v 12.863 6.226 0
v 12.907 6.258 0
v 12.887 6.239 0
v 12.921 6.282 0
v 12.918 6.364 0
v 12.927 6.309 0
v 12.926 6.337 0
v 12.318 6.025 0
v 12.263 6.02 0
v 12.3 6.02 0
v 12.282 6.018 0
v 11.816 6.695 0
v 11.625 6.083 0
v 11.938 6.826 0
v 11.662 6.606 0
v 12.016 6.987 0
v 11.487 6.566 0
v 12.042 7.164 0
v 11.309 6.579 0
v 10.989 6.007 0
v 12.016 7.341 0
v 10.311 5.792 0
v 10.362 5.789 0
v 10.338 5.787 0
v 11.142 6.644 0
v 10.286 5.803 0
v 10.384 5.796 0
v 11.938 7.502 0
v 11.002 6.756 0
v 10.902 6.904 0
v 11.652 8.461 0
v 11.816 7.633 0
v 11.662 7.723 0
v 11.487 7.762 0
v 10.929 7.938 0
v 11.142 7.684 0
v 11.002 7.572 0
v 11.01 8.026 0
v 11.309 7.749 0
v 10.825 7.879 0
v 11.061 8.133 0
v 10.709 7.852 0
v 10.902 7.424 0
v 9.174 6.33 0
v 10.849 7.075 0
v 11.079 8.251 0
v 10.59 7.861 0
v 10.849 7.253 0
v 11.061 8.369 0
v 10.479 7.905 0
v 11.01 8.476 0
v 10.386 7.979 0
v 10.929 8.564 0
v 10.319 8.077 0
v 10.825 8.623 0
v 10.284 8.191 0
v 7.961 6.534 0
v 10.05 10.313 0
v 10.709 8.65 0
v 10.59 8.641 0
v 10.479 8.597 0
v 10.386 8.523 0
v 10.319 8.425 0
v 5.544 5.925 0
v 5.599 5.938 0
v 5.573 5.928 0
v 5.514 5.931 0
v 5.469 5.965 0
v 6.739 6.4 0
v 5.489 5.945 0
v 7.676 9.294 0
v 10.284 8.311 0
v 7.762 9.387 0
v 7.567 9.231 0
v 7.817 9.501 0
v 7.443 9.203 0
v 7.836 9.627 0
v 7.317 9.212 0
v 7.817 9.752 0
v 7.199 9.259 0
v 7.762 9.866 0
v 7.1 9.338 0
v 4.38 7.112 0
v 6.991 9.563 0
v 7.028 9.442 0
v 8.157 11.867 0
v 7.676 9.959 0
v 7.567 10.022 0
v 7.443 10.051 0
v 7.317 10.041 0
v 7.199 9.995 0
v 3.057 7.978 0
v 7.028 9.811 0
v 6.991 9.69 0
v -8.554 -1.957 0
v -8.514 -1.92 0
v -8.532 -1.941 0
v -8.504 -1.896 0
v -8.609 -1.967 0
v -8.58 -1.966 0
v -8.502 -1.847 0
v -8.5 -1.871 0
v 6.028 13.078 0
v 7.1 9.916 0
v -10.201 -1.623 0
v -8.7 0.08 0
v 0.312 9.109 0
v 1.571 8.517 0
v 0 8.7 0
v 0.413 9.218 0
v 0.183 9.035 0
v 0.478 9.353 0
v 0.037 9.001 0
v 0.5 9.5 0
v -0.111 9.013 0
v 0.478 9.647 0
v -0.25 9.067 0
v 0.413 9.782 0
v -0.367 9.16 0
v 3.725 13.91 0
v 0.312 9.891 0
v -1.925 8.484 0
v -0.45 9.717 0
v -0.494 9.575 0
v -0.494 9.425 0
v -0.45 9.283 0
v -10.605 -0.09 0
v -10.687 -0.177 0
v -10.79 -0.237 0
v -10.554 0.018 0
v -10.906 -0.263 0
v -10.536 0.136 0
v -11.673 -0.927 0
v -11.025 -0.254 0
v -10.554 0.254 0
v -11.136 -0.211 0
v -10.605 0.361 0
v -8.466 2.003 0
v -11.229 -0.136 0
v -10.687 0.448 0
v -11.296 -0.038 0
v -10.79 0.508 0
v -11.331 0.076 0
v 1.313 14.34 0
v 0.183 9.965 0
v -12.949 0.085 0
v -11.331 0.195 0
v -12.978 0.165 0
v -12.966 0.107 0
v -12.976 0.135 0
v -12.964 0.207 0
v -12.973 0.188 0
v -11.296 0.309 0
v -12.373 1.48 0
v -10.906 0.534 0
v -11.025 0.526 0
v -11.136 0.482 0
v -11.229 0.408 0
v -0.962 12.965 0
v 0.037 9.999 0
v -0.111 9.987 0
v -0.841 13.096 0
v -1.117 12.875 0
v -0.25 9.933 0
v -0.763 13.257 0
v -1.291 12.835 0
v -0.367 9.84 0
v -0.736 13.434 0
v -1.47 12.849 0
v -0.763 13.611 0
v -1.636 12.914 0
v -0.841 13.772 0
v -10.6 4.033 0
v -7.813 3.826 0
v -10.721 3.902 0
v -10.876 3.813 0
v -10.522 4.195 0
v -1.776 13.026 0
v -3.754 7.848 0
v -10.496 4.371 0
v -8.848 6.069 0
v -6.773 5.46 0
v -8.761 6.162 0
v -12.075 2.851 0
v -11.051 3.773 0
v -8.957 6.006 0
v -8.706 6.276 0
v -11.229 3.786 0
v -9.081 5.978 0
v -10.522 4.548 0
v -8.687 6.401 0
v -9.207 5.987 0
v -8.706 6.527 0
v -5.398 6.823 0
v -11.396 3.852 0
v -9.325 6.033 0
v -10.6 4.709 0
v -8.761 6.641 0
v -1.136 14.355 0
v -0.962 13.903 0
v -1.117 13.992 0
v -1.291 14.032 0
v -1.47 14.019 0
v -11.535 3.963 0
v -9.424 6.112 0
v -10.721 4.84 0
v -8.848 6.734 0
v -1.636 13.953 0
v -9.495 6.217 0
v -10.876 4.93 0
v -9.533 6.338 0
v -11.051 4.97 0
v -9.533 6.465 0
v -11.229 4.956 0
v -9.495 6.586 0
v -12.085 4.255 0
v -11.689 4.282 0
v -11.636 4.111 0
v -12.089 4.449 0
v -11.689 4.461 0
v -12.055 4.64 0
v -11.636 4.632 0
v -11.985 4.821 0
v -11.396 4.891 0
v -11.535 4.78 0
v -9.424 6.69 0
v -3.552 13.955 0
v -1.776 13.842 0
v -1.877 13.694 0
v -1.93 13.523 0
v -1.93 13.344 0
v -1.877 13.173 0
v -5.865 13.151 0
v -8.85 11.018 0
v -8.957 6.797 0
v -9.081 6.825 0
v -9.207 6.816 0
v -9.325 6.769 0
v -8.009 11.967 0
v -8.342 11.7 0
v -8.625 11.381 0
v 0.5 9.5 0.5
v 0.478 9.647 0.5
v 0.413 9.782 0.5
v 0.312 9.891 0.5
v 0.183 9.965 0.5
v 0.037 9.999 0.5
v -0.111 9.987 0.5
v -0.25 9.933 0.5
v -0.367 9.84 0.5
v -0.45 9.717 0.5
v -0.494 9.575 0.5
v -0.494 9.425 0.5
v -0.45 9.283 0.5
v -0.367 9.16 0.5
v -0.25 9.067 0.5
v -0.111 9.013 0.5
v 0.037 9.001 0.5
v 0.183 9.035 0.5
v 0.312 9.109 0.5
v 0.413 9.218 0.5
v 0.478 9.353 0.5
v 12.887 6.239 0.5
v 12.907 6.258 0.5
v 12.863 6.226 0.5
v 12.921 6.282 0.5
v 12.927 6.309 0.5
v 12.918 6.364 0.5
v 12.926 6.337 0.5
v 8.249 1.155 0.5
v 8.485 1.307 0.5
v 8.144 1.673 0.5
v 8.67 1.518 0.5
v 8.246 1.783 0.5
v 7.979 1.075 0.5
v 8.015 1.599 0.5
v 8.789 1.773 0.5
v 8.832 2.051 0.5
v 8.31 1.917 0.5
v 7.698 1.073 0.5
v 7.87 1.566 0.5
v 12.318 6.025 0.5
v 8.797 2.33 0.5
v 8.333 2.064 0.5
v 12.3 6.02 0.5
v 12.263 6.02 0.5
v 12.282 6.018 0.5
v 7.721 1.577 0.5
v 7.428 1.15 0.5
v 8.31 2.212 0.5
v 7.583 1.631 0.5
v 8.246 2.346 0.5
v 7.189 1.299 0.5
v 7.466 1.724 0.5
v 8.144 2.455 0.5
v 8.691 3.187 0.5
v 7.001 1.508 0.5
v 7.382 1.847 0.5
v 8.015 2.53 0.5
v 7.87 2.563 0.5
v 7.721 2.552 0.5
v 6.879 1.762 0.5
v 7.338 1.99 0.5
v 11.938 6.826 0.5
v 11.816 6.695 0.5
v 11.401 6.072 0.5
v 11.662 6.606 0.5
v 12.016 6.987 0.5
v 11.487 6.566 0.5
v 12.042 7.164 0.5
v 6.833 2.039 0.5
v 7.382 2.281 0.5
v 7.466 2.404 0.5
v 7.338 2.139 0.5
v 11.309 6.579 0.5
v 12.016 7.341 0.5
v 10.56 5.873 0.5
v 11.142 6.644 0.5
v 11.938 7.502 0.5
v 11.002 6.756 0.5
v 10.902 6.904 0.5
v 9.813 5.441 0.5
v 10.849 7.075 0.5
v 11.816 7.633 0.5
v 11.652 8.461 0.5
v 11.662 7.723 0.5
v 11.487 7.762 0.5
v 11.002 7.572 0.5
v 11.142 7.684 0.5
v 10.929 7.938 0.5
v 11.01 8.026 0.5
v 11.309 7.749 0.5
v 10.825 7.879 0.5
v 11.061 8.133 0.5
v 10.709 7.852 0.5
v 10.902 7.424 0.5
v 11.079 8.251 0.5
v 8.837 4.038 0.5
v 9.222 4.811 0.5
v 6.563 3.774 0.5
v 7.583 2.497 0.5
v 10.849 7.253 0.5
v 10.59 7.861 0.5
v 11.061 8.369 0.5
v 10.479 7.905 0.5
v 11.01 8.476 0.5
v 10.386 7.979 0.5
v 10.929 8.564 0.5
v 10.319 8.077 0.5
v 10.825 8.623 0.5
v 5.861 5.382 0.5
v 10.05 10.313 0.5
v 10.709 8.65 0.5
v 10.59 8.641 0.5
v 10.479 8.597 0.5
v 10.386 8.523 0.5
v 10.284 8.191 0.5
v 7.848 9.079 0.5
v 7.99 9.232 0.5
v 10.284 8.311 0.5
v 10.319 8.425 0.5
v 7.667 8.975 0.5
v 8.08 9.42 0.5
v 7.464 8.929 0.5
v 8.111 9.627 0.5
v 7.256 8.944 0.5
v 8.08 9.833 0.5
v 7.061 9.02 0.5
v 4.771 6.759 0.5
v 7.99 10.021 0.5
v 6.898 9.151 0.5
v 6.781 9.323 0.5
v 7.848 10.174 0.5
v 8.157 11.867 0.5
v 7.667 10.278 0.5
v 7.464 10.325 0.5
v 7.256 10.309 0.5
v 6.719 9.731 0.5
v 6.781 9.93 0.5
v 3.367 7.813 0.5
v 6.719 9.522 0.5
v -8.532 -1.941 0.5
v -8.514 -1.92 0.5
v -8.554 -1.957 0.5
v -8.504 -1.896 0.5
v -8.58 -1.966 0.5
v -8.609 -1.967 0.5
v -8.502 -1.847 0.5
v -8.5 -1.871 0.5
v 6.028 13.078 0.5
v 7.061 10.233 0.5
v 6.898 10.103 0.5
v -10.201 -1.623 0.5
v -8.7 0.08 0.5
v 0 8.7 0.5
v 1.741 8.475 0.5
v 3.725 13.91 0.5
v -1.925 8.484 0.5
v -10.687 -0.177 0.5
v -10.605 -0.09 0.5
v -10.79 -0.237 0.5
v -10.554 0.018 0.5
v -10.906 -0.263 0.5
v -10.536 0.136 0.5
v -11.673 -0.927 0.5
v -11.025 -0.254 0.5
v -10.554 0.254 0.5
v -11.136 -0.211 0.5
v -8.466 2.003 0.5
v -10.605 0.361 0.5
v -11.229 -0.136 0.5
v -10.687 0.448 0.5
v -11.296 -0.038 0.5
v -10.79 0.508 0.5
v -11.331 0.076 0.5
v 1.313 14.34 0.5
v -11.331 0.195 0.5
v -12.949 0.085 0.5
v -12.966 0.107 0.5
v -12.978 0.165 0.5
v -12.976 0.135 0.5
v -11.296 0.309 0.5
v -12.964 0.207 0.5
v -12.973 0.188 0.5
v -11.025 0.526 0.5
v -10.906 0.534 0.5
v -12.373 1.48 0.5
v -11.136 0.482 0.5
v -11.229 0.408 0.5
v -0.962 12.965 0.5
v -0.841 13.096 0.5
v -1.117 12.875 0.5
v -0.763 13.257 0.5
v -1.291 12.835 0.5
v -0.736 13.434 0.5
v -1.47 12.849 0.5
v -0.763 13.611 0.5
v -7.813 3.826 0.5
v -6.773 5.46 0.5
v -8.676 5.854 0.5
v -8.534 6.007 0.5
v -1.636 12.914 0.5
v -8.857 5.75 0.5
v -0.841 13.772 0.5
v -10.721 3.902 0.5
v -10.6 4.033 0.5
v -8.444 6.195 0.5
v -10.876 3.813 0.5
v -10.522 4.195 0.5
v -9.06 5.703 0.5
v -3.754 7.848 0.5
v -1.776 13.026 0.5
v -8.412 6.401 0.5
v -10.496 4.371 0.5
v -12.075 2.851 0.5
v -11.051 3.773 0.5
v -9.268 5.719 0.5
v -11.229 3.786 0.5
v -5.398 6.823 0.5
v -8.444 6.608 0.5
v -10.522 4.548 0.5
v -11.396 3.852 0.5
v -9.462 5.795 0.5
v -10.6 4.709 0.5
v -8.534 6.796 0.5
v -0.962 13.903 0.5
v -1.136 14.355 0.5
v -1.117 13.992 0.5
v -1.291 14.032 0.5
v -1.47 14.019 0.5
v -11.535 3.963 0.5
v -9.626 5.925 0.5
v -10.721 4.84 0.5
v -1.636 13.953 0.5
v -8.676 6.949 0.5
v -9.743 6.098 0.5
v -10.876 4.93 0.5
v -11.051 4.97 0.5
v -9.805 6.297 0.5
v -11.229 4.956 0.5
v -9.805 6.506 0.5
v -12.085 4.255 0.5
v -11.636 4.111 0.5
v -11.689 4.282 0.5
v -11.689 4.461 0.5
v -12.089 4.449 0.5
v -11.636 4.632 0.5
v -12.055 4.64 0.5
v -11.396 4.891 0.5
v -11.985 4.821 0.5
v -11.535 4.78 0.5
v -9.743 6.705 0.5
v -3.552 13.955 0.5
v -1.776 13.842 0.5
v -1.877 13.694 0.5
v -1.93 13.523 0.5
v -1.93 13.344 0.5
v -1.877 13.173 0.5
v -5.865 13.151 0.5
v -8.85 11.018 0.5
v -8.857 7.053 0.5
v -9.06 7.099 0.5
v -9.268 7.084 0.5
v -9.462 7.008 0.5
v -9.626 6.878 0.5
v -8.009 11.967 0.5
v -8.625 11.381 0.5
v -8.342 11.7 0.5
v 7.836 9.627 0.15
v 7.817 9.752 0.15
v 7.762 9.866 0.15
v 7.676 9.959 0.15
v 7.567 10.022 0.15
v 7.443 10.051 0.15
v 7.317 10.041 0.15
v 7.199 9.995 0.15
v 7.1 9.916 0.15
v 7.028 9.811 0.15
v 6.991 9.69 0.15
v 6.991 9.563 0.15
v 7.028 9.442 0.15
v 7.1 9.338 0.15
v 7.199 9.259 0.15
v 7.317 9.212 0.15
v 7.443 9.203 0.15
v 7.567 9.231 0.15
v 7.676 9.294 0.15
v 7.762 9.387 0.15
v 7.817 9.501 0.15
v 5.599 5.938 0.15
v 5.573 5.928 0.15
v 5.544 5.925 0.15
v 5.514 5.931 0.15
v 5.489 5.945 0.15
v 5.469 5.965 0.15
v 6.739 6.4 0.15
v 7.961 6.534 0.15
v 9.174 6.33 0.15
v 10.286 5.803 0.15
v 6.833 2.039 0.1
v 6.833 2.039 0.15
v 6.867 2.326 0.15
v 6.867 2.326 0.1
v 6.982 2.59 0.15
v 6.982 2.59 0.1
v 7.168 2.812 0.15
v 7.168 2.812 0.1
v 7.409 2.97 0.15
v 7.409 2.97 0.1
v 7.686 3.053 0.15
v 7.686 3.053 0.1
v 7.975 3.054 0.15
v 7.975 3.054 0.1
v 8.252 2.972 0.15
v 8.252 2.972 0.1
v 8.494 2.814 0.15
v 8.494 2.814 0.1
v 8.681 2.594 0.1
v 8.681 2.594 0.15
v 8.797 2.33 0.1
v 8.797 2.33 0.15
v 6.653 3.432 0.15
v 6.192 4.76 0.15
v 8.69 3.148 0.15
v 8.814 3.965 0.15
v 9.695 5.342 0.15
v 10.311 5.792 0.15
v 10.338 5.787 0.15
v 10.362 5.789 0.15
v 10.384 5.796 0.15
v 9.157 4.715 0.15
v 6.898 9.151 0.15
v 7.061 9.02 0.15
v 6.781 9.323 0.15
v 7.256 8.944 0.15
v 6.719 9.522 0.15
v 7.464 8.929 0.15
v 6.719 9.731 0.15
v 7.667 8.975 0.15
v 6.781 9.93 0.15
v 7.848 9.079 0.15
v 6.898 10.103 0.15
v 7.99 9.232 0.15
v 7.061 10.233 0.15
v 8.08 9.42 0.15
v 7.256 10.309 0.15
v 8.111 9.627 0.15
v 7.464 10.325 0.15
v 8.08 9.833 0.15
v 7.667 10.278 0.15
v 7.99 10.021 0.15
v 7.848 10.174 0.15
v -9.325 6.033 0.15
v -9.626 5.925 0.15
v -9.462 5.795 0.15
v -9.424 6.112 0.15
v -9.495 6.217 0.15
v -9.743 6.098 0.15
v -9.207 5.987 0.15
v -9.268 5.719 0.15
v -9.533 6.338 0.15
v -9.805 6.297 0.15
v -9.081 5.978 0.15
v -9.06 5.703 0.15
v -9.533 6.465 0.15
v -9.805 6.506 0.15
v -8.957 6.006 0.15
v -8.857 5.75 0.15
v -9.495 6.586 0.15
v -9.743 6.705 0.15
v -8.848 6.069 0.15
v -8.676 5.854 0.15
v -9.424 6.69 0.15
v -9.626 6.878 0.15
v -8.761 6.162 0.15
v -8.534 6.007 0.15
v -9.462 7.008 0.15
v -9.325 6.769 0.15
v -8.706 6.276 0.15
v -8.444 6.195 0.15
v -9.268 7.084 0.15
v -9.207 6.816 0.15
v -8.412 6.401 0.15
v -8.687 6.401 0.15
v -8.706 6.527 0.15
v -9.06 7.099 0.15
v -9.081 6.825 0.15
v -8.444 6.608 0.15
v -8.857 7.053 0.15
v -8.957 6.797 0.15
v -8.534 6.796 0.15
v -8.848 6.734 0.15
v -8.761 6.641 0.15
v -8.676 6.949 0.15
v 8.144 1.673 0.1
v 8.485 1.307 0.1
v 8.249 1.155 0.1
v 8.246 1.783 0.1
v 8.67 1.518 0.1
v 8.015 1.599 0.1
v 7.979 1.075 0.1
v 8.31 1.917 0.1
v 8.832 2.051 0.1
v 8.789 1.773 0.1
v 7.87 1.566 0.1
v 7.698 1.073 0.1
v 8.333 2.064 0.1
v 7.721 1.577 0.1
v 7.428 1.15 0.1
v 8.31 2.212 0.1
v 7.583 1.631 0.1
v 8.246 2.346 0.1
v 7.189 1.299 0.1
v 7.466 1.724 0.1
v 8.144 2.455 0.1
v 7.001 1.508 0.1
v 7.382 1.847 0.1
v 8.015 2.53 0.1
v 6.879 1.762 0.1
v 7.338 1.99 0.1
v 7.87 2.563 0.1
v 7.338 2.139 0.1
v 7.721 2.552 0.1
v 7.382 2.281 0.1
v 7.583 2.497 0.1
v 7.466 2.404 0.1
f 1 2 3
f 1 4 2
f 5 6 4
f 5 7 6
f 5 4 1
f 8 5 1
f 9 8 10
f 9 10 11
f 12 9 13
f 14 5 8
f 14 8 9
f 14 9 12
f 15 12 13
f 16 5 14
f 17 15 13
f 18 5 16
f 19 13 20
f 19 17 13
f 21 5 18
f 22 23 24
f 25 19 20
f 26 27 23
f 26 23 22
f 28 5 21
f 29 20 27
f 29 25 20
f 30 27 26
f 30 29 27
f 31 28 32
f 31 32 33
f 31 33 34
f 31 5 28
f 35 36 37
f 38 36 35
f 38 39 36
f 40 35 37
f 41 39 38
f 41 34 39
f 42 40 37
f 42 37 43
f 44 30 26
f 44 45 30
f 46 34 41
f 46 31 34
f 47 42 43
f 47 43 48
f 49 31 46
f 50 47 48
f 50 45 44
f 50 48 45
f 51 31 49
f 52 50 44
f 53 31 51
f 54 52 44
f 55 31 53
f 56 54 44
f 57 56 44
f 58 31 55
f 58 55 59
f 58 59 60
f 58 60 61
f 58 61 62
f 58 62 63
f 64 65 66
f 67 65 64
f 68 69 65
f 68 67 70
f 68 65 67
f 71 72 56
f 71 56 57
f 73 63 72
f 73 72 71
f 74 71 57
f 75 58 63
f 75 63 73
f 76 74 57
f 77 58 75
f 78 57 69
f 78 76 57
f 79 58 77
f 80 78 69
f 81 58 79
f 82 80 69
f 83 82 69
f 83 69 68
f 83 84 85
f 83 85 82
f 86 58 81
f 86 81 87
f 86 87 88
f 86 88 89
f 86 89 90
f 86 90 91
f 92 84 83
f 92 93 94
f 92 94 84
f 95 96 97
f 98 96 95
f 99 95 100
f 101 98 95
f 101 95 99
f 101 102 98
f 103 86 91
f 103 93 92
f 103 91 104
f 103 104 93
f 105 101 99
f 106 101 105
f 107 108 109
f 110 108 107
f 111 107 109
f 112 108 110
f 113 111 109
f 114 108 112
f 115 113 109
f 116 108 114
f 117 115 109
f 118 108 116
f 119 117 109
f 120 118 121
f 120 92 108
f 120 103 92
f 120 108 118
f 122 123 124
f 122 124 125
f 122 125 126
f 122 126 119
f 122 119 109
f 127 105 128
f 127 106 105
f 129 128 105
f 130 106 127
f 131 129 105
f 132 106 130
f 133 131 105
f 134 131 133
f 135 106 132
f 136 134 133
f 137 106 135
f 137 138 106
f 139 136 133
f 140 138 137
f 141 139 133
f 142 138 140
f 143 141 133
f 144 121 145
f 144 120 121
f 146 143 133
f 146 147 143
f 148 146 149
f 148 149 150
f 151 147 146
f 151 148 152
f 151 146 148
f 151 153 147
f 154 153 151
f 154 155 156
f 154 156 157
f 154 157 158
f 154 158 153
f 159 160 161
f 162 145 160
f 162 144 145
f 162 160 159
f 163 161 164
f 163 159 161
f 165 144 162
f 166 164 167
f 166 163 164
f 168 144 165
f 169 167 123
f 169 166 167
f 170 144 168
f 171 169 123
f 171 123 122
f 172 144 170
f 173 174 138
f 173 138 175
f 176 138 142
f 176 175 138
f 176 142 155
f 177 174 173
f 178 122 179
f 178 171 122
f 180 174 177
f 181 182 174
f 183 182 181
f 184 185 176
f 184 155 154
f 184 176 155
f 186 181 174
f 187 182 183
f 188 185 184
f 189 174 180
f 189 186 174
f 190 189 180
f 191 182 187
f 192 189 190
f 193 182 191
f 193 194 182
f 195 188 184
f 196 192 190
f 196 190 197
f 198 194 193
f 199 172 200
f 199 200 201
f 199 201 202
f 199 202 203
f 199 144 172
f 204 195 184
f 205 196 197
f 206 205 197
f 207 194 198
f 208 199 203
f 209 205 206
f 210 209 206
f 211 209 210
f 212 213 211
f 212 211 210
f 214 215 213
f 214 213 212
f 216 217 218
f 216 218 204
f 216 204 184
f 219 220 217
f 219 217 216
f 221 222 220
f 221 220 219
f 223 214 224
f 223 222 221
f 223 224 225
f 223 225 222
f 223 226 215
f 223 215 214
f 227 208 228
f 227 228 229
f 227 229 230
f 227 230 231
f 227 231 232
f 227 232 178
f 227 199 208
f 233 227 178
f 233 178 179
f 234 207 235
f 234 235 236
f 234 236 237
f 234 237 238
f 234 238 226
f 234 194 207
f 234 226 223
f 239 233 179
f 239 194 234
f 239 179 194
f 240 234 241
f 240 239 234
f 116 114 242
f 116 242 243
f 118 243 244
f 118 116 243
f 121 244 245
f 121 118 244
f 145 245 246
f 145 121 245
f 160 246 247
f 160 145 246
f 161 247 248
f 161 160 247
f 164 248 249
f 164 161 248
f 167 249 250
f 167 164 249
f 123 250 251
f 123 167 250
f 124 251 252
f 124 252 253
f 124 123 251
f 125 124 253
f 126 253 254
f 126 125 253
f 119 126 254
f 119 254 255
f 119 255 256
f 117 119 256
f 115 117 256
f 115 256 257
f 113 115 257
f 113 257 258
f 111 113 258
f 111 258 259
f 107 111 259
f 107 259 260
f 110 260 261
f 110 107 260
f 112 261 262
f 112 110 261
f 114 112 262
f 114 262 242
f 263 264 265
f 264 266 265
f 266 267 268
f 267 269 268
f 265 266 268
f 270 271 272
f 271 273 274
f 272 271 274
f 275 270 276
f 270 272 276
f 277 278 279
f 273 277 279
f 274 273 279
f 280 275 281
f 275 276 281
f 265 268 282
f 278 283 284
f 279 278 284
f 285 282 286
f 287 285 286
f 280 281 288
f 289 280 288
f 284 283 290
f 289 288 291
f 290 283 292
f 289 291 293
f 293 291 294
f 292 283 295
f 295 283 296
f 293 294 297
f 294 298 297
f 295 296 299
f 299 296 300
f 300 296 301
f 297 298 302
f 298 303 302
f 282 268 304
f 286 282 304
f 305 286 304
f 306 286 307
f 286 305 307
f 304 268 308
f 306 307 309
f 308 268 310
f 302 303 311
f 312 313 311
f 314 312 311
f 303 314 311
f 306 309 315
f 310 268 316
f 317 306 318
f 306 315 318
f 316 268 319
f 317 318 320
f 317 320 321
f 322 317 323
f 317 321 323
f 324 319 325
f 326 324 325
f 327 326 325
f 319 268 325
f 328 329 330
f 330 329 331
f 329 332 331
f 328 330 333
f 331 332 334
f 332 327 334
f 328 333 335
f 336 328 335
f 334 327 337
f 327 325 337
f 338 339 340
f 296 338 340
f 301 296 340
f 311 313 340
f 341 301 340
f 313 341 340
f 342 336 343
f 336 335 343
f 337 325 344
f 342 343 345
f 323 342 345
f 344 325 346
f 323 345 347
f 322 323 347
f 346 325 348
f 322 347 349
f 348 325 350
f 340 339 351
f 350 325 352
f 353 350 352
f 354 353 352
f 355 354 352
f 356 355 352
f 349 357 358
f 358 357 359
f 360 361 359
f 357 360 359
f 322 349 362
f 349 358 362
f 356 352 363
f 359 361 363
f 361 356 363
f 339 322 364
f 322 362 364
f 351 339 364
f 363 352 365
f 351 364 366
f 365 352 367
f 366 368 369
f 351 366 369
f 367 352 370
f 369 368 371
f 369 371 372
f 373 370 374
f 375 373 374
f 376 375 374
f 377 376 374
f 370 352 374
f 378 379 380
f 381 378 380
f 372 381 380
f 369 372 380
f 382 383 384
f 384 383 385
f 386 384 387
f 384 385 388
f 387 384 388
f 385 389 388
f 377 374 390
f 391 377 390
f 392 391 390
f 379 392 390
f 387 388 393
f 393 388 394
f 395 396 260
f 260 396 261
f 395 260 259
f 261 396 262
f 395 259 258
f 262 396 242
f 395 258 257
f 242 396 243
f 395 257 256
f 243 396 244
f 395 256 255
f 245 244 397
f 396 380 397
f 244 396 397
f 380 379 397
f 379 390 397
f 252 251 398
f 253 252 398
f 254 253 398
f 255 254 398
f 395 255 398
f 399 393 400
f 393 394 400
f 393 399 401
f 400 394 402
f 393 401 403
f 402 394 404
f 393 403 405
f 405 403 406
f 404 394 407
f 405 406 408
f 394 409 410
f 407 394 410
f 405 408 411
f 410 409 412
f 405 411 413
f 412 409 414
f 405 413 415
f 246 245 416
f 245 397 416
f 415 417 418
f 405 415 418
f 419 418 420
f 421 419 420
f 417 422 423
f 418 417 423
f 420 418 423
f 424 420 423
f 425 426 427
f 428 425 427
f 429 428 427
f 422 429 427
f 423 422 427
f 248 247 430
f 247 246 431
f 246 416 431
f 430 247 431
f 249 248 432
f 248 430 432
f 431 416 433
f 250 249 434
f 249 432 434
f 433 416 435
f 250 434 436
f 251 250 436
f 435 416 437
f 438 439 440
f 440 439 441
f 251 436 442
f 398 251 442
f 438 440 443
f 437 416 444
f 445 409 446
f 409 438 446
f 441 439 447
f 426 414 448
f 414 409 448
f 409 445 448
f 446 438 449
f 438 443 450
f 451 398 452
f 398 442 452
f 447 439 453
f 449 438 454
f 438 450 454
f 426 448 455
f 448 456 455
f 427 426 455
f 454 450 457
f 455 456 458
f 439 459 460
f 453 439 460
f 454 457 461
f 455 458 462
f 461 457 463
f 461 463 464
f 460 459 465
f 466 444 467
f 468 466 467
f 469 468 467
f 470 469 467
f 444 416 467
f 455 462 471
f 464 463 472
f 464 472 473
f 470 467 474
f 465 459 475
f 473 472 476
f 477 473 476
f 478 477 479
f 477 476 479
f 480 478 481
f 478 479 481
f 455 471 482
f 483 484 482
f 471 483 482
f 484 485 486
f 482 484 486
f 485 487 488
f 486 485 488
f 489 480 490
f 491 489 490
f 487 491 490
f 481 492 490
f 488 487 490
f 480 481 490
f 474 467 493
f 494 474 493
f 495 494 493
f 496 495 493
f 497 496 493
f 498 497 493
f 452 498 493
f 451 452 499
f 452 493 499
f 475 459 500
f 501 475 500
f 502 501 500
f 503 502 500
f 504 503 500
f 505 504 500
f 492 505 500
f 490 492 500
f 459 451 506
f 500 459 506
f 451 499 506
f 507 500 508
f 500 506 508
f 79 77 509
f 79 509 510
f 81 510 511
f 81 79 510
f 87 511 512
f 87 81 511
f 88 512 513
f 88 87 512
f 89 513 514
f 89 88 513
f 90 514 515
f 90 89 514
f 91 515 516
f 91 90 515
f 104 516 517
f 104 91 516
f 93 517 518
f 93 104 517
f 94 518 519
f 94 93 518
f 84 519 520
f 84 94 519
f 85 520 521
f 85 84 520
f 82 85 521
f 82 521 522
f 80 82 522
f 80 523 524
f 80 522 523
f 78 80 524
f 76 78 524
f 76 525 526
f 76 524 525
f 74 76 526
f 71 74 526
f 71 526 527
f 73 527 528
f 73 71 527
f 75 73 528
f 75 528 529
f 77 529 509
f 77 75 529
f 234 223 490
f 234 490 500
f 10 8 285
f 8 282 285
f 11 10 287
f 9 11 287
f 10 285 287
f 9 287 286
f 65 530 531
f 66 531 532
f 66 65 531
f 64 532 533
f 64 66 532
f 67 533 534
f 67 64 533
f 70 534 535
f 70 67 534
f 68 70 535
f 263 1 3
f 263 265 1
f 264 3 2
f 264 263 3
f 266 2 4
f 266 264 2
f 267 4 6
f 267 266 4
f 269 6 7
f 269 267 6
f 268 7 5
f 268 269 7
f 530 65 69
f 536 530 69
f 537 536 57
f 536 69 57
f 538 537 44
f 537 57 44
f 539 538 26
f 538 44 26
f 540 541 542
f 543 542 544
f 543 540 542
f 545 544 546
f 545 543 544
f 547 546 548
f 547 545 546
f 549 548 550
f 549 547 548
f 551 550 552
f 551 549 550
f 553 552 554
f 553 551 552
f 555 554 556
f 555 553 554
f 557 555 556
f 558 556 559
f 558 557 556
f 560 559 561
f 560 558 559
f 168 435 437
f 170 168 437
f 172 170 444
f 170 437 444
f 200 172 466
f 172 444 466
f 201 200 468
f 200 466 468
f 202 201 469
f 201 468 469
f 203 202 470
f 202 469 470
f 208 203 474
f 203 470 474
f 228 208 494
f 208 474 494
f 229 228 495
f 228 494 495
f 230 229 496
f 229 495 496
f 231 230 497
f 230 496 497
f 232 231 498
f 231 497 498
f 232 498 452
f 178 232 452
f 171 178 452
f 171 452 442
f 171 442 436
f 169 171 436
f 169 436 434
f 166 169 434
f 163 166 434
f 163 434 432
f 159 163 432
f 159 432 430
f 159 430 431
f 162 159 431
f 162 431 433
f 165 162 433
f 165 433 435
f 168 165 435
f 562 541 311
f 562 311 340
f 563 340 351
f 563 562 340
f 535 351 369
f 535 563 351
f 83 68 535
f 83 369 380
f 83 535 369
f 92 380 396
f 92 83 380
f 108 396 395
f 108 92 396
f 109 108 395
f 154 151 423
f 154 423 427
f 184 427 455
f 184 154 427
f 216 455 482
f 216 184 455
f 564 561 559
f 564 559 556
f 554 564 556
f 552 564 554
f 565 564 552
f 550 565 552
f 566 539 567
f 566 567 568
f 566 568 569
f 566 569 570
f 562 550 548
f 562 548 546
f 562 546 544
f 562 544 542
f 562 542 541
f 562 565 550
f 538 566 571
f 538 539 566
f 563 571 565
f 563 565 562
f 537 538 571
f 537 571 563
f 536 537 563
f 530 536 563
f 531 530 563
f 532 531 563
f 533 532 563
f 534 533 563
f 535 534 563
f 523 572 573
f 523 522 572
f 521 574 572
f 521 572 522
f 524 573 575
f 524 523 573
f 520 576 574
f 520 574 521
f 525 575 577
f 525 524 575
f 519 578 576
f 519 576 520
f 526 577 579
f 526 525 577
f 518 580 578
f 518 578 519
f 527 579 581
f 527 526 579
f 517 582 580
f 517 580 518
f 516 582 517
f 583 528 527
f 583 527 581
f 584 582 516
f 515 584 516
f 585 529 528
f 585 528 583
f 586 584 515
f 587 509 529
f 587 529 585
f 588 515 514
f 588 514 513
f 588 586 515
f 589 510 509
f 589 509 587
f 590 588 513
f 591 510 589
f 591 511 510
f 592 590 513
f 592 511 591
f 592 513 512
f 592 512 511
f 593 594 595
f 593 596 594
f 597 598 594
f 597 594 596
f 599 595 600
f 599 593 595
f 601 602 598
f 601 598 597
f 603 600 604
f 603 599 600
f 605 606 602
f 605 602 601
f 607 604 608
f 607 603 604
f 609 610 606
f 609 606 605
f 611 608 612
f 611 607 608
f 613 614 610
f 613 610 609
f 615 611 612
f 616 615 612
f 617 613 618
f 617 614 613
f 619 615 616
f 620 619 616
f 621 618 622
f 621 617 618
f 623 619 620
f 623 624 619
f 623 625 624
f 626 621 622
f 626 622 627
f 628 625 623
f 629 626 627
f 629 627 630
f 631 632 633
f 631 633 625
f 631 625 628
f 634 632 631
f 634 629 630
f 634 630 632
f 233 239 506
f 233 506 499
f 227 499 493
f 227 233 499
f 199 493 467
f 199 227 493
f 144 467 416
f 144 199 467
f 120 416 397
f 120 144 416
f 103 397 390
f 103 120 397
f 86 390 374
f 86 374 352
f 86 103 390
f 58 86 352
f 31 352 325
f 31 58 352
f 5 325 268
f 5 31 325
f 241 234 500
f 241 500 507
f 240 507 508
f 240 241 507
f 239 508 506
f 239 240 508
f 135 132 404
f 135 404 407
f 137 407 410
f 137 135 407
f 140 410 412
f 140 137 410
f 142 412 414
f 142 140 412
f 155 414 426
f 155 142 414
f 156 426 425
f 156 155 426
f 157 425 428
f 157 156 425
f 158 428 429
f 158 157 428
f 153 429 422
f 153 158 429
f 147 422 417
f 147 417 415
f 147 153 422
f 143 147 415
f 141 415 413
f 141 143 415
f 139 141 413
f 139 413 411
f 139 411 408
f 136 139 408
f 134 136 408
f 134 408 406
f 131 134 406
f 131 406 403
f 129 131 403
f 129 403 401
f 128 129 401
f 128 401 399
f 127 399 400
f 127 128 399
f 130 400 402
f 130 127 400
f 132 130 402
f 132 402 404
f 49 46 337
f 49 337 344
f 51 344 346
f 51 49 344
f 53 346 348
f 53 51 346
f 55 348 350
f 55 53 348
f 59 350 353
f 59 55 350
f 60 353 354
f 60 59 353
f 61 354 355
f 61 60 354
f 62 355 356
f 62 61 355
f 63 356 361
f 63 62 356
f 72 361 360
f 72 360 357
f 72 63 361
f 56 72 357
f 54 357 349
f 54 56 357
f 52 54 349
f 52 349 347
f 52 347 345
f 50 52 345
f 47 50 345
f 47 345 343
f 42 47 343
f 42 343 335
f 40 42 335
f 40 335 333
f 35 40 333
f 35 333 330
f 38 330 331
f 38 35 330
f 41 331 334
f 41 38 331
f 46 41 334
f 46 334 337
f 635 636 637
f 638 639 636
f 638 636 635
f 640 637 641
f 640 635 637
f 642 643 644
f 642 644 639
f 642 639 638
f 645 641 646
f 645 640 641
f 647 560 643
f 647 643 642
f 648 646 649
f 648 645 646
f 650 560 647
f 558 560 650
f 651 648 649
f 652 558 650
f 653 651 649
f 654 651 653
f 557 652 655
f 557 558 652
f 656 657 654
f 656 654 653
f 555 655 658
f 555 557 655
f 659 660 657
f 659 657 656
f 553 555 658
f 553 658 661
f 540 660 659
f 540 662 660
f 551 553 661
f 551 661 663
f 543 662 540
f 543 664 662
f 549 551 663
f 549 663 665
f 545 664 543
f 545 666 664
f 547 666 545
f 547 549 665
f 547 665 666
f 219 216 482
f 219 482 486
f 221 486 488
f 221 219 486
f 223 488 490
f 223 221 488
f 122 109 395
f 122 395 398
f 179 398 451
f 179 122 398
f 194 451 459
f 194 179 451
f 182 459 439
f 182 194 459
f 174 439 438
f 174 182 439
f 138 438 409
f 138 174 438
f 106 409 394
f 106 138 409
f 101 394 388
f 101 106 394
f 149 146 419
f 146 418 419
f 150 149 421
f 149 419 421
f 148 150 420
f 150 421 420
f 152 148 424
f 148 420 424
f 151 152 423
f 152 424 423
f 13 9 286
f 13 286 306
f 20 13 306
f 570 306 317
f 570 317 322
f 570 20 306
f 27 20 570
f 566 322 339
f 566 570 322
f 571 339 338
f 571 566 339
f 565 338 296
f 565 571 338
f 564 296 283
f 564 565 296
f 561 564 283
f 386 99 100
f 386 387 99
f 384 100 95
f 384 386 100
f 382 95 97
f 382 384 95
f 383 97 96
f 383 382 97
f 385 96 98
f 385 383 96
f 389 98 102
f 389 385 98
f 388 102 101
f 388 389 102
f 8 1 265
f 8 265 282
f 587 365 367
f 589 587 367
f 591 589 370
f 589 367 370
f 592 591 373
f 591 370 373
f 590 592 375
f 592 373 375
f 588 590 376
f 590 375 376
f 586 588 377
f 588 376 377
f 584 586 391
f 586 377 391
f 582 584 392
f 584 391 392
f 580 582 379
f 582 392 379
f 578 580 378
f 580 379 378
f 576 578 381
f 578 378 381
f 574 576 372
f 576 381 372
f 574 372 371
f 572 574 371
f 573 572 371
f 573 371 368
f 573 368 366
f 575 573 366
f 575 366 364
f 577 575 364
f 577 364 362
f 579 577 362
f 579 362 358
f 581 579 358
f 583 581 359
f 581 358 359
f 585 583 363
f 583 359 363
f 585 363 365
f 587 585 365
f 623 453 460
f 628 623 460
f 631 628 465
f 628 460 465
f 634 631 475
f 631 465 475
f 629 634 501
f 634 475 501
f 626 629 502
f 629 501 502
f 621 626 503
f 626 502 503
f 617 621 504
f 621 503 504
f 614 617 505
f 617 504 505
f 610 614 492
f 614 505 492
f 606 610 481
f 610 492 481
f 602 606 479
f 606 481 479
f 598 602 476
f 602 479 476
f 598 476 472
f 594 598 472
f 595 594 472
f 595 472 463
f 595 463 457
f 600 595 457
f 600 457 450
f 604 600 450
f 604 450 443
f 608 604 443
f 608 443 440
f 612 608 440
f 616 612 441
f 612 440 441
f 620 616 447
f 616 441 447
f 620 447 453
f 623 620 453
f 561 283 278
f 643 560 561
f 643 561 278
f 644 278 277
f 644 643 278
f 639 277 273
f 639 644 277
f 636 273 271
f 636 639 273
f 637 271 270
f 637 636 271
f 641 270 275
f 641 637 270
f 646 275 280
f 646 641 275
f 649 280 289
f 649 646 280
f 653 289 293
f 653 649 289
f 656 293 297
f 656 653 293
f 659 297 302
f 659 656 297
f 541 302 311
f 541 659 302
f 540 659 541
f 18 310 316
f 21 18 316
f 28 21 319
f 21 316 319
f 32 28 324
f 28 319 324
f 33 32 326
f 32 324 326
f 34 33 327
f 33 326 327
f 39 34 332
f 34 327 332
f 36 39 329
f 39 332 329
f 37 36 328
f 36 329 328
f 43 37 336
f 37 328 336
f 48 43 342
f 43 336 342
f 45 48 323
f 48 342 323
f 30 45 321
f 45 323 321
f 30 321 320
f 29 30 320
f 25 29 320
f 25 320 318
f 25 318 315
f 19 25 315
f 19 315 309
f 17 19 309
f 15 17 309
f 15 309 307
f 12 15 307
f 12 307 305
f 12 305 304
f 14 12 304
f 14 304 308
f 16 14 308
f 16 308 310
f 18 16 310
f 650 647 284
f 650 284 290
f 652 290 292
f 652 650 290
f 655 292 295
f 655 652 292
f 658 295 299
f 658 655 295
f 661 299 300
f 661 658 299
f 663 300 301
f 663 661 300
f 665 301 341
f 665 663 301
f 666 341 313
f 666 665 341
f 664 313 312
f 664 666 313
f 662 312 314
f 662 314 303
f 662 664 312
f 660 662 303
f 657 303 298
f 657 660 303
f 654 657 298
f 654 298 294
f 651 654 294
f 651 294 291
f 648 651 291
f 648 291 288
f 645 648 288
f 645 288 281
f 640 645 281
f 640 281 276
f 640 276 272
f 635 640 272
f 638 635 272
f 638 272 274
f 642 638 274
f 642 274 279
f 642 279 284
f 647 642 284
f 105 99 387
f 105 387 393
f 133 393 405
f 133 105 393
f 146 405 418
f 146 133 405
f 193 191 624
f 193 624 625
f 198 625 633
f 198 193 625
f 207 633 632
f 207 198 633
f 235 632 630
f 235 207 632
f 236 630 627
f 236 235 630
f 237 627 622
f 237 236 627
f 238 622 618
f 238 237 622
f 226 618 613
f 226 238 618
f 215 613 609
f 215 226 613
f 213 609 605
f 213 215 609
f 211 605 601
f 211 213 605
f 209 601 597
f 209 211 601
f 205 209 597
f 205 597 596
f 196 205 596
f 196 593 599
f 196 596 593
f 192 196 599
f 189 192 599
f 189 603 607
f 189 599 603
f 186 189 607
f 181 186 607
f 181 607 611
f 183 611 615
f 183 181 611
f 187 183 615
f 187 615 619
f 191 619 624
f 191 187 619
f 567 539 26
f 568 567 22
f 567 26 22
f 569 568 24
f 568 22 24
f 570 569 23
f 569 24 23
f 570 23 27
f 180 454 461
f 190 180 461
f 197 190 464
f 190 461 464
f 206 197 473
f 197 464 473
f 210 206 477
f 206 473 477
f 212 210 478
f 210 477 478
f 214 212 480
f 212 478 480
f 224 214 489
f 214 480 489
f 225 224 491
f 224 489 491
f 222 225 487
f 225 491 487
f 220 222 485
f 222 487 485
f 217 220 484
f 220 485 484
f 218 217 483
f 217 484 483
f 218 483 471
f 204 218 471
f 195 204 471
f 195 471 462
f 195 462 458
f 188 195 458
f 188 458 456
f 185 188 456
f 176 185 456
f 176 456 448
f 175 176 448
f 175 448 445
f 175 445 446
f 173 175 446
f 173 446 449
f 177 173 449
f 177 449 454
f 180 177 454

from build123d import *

# Parameters (mm, degrees)
SKETCH_1_R          = 0.5
SKETCH_1_R_2        = 0.4
SKETCH_1_R_3        = 0.425
EXTRUDE_1_DEPTH     = 0.5
SKETCH_2_R          = 4.472023715
CUT_EXTRUDE_1_DEPTH = 0.1
SKETCH_3_R          = 0.7
CUT_EXTRUDE_2_DEPTH = 0.35
SKETCH_4_R          = 4.472023715
SKETCH_4_R_2        = 1
CUT_EXTRUDE_3_DEPTH = 0.05
FILLET_1_R          = 0.1
SKETCH_5_R          = 0.6
CUT_EXTRUDE_4_DEPTH = 10


with BuildPart() as part:
    # Эскиз1 → Бобышка-Вытянуть1 (new body)
    with BuildSketch(Plane.XY):
        with BuildLine():
            Line((12.966197468, 6.264002172), (12.290985741, 6.014467613))
            ThreePointArc((12.290985741, 6.014467613), (9.503979032, 5.15824387), (8.79665468, 2.329778252))
            ThreePointArc((8.79665468, 2.329778252), (7.979149058, 1.075012683), (6.832886069, 2.038772631))
            ThreePointArc((6.832886069, 2.038772631), (4.771275566, 6.759132651), (0, 8.7))
            ThreePointArc((0, 8.7), (-6.815908497, 5.406791226), (-8.471768795, -1.979680148))
            ThreePointArc((-8.471768795, -1.979680148), (-10.930300525, -1.329835953), (-13.004676896, 0.141095189))
            ThreePointArc((-13.004676896, 0.141095189), (-12.194658567, 2.119542362), (-12.085233501, 4.254585469))
            ThreePointArc((-12.085233501, 4.254585469), (-12.076804664, 4.545349887), (-11.984771054, 4.821293371))
            Line((-11.984771054, 4.821293371), (-8.849528074, 11.018100783))
            ThreePointArc((-8.849528074, 11.018100783), (-8.490551174, 11.546729856), (-8.009291923, 11.967089993))
            ThreePointArc((-8.009291923, 11.967089993), (3.778098837, 13.895537743), (12.966197468, 6.264002172))
        make_face()
        with Locations((7.832562474, 2.064210526)):
            Circle(SKETCH_1_R, mode=Mode.SUBTRACT)
        with Locations((0, 9.5)):
            Circle(SKETCH_1_R, mode=Mode.SUBTRACT)
        with Locations((-10.935928421, 0.135601584)):
            Circle(SKETCH_1_R_2, mode=Mode.SUBTRACT)
        with Locations((-9.112495388, 6.401403857)):
            Circle(SKETCH_1_R_3, mode=Mode.SUBTRACT)
        with Locations((7.411343366, 9.626689996)):
            Circle(SKETCH_1_R_3, mode=Mode.SUBTRACT)
        with Locations((10.679257851, 8.251019039)):
            Circle(SKETCH_1_R_2, mode=Mode.SUBTRACT)
    extrude(amount=EXTRUDE_1_DEPTH)

    # Эскиз2 → Вырез-Вытянуть1 (cut)
    with BuildSketch(Plane(origin=(0, 0, 0), x_dir=(-1, 0, 0), z_dir=(0, 0, -1))):
        with Locations((-7.832562474, 2.064210526)):
            Circle(SKETCH_2_R)
    extrude(amount=-CUT_EXTRUDE_1_DEPTH, mode=Mode.SUBTRACT)

    # Эскиз3 → Вырез-Вытянуть2 (cut)
    with BuildSketch(Plane.XY.offset(0.5)):
        with Locations((-9.112495388, 6.401403857)):
            Circle(SKETCH_3_R)
        with Locations((7.411343366, 9.626689996)):
            Circle(SKETCH_3_R)
    extrude(amount=-CUT_EXTRUDE_2_DEPTH, mode=Mode.SUBTRACT)

    # Эскиз4 → Вырез-Вытянуть3 (cut)
    with BuildSketch(Plane(origin=(0, 0, 0.1), x_dir=(-1, 0, 0), z_dir=(0, 0, -1))):
        with Locations((-7.832562474, 2.064210526)):
            Circle(SKETCH_4_R)
        with Locations((-7.832562474, 2.064210526)):
            Circle(SKETCH_4_R_2, mode=Mode.SUBTRACT)
    extrude(amount=-CUT_EXTRUDE_3_DEPTH, mode=Mode.SUBTRACT)

    # Скругление1
    fillet_1_edges = [part.edges().sort_by_distance(p)[0] for p in [
        (12.966197468, 6.264002172, 0.25),
        (12.290985741, 6.014467613, 0.25),
        (-8.471768795, -1.979680148, 0.25),
        (-13.004676896, 0.141095189, 0.25),
        (10.333057023, 5.771840917, 0.075),
        (5.521987637, 5.893079815, 0.075),
    ]]
    fillet(fillet_1_edges, radius=FILLET_1_R)

    # Эскиз5 → Вырез-Вытянуть4 (cut)
    with BuildSketch(Plane.XY.offset(0.5)):
        with Locations((-11.09555803, 4.371400595)):
            Circle(SKETCH_5_R)
        with Locations((11.442307716, 7.164048725)):
            Circle(SKETCH_5_R)
        with Locations((-1.336244315, 13.433705785)):
            Circle(SKETCH_5_R)
    extrude(amount=-CUT_EXTRUDE_4_DEPTH, mode=Mode.SUBTRACT)


solid = part.part
